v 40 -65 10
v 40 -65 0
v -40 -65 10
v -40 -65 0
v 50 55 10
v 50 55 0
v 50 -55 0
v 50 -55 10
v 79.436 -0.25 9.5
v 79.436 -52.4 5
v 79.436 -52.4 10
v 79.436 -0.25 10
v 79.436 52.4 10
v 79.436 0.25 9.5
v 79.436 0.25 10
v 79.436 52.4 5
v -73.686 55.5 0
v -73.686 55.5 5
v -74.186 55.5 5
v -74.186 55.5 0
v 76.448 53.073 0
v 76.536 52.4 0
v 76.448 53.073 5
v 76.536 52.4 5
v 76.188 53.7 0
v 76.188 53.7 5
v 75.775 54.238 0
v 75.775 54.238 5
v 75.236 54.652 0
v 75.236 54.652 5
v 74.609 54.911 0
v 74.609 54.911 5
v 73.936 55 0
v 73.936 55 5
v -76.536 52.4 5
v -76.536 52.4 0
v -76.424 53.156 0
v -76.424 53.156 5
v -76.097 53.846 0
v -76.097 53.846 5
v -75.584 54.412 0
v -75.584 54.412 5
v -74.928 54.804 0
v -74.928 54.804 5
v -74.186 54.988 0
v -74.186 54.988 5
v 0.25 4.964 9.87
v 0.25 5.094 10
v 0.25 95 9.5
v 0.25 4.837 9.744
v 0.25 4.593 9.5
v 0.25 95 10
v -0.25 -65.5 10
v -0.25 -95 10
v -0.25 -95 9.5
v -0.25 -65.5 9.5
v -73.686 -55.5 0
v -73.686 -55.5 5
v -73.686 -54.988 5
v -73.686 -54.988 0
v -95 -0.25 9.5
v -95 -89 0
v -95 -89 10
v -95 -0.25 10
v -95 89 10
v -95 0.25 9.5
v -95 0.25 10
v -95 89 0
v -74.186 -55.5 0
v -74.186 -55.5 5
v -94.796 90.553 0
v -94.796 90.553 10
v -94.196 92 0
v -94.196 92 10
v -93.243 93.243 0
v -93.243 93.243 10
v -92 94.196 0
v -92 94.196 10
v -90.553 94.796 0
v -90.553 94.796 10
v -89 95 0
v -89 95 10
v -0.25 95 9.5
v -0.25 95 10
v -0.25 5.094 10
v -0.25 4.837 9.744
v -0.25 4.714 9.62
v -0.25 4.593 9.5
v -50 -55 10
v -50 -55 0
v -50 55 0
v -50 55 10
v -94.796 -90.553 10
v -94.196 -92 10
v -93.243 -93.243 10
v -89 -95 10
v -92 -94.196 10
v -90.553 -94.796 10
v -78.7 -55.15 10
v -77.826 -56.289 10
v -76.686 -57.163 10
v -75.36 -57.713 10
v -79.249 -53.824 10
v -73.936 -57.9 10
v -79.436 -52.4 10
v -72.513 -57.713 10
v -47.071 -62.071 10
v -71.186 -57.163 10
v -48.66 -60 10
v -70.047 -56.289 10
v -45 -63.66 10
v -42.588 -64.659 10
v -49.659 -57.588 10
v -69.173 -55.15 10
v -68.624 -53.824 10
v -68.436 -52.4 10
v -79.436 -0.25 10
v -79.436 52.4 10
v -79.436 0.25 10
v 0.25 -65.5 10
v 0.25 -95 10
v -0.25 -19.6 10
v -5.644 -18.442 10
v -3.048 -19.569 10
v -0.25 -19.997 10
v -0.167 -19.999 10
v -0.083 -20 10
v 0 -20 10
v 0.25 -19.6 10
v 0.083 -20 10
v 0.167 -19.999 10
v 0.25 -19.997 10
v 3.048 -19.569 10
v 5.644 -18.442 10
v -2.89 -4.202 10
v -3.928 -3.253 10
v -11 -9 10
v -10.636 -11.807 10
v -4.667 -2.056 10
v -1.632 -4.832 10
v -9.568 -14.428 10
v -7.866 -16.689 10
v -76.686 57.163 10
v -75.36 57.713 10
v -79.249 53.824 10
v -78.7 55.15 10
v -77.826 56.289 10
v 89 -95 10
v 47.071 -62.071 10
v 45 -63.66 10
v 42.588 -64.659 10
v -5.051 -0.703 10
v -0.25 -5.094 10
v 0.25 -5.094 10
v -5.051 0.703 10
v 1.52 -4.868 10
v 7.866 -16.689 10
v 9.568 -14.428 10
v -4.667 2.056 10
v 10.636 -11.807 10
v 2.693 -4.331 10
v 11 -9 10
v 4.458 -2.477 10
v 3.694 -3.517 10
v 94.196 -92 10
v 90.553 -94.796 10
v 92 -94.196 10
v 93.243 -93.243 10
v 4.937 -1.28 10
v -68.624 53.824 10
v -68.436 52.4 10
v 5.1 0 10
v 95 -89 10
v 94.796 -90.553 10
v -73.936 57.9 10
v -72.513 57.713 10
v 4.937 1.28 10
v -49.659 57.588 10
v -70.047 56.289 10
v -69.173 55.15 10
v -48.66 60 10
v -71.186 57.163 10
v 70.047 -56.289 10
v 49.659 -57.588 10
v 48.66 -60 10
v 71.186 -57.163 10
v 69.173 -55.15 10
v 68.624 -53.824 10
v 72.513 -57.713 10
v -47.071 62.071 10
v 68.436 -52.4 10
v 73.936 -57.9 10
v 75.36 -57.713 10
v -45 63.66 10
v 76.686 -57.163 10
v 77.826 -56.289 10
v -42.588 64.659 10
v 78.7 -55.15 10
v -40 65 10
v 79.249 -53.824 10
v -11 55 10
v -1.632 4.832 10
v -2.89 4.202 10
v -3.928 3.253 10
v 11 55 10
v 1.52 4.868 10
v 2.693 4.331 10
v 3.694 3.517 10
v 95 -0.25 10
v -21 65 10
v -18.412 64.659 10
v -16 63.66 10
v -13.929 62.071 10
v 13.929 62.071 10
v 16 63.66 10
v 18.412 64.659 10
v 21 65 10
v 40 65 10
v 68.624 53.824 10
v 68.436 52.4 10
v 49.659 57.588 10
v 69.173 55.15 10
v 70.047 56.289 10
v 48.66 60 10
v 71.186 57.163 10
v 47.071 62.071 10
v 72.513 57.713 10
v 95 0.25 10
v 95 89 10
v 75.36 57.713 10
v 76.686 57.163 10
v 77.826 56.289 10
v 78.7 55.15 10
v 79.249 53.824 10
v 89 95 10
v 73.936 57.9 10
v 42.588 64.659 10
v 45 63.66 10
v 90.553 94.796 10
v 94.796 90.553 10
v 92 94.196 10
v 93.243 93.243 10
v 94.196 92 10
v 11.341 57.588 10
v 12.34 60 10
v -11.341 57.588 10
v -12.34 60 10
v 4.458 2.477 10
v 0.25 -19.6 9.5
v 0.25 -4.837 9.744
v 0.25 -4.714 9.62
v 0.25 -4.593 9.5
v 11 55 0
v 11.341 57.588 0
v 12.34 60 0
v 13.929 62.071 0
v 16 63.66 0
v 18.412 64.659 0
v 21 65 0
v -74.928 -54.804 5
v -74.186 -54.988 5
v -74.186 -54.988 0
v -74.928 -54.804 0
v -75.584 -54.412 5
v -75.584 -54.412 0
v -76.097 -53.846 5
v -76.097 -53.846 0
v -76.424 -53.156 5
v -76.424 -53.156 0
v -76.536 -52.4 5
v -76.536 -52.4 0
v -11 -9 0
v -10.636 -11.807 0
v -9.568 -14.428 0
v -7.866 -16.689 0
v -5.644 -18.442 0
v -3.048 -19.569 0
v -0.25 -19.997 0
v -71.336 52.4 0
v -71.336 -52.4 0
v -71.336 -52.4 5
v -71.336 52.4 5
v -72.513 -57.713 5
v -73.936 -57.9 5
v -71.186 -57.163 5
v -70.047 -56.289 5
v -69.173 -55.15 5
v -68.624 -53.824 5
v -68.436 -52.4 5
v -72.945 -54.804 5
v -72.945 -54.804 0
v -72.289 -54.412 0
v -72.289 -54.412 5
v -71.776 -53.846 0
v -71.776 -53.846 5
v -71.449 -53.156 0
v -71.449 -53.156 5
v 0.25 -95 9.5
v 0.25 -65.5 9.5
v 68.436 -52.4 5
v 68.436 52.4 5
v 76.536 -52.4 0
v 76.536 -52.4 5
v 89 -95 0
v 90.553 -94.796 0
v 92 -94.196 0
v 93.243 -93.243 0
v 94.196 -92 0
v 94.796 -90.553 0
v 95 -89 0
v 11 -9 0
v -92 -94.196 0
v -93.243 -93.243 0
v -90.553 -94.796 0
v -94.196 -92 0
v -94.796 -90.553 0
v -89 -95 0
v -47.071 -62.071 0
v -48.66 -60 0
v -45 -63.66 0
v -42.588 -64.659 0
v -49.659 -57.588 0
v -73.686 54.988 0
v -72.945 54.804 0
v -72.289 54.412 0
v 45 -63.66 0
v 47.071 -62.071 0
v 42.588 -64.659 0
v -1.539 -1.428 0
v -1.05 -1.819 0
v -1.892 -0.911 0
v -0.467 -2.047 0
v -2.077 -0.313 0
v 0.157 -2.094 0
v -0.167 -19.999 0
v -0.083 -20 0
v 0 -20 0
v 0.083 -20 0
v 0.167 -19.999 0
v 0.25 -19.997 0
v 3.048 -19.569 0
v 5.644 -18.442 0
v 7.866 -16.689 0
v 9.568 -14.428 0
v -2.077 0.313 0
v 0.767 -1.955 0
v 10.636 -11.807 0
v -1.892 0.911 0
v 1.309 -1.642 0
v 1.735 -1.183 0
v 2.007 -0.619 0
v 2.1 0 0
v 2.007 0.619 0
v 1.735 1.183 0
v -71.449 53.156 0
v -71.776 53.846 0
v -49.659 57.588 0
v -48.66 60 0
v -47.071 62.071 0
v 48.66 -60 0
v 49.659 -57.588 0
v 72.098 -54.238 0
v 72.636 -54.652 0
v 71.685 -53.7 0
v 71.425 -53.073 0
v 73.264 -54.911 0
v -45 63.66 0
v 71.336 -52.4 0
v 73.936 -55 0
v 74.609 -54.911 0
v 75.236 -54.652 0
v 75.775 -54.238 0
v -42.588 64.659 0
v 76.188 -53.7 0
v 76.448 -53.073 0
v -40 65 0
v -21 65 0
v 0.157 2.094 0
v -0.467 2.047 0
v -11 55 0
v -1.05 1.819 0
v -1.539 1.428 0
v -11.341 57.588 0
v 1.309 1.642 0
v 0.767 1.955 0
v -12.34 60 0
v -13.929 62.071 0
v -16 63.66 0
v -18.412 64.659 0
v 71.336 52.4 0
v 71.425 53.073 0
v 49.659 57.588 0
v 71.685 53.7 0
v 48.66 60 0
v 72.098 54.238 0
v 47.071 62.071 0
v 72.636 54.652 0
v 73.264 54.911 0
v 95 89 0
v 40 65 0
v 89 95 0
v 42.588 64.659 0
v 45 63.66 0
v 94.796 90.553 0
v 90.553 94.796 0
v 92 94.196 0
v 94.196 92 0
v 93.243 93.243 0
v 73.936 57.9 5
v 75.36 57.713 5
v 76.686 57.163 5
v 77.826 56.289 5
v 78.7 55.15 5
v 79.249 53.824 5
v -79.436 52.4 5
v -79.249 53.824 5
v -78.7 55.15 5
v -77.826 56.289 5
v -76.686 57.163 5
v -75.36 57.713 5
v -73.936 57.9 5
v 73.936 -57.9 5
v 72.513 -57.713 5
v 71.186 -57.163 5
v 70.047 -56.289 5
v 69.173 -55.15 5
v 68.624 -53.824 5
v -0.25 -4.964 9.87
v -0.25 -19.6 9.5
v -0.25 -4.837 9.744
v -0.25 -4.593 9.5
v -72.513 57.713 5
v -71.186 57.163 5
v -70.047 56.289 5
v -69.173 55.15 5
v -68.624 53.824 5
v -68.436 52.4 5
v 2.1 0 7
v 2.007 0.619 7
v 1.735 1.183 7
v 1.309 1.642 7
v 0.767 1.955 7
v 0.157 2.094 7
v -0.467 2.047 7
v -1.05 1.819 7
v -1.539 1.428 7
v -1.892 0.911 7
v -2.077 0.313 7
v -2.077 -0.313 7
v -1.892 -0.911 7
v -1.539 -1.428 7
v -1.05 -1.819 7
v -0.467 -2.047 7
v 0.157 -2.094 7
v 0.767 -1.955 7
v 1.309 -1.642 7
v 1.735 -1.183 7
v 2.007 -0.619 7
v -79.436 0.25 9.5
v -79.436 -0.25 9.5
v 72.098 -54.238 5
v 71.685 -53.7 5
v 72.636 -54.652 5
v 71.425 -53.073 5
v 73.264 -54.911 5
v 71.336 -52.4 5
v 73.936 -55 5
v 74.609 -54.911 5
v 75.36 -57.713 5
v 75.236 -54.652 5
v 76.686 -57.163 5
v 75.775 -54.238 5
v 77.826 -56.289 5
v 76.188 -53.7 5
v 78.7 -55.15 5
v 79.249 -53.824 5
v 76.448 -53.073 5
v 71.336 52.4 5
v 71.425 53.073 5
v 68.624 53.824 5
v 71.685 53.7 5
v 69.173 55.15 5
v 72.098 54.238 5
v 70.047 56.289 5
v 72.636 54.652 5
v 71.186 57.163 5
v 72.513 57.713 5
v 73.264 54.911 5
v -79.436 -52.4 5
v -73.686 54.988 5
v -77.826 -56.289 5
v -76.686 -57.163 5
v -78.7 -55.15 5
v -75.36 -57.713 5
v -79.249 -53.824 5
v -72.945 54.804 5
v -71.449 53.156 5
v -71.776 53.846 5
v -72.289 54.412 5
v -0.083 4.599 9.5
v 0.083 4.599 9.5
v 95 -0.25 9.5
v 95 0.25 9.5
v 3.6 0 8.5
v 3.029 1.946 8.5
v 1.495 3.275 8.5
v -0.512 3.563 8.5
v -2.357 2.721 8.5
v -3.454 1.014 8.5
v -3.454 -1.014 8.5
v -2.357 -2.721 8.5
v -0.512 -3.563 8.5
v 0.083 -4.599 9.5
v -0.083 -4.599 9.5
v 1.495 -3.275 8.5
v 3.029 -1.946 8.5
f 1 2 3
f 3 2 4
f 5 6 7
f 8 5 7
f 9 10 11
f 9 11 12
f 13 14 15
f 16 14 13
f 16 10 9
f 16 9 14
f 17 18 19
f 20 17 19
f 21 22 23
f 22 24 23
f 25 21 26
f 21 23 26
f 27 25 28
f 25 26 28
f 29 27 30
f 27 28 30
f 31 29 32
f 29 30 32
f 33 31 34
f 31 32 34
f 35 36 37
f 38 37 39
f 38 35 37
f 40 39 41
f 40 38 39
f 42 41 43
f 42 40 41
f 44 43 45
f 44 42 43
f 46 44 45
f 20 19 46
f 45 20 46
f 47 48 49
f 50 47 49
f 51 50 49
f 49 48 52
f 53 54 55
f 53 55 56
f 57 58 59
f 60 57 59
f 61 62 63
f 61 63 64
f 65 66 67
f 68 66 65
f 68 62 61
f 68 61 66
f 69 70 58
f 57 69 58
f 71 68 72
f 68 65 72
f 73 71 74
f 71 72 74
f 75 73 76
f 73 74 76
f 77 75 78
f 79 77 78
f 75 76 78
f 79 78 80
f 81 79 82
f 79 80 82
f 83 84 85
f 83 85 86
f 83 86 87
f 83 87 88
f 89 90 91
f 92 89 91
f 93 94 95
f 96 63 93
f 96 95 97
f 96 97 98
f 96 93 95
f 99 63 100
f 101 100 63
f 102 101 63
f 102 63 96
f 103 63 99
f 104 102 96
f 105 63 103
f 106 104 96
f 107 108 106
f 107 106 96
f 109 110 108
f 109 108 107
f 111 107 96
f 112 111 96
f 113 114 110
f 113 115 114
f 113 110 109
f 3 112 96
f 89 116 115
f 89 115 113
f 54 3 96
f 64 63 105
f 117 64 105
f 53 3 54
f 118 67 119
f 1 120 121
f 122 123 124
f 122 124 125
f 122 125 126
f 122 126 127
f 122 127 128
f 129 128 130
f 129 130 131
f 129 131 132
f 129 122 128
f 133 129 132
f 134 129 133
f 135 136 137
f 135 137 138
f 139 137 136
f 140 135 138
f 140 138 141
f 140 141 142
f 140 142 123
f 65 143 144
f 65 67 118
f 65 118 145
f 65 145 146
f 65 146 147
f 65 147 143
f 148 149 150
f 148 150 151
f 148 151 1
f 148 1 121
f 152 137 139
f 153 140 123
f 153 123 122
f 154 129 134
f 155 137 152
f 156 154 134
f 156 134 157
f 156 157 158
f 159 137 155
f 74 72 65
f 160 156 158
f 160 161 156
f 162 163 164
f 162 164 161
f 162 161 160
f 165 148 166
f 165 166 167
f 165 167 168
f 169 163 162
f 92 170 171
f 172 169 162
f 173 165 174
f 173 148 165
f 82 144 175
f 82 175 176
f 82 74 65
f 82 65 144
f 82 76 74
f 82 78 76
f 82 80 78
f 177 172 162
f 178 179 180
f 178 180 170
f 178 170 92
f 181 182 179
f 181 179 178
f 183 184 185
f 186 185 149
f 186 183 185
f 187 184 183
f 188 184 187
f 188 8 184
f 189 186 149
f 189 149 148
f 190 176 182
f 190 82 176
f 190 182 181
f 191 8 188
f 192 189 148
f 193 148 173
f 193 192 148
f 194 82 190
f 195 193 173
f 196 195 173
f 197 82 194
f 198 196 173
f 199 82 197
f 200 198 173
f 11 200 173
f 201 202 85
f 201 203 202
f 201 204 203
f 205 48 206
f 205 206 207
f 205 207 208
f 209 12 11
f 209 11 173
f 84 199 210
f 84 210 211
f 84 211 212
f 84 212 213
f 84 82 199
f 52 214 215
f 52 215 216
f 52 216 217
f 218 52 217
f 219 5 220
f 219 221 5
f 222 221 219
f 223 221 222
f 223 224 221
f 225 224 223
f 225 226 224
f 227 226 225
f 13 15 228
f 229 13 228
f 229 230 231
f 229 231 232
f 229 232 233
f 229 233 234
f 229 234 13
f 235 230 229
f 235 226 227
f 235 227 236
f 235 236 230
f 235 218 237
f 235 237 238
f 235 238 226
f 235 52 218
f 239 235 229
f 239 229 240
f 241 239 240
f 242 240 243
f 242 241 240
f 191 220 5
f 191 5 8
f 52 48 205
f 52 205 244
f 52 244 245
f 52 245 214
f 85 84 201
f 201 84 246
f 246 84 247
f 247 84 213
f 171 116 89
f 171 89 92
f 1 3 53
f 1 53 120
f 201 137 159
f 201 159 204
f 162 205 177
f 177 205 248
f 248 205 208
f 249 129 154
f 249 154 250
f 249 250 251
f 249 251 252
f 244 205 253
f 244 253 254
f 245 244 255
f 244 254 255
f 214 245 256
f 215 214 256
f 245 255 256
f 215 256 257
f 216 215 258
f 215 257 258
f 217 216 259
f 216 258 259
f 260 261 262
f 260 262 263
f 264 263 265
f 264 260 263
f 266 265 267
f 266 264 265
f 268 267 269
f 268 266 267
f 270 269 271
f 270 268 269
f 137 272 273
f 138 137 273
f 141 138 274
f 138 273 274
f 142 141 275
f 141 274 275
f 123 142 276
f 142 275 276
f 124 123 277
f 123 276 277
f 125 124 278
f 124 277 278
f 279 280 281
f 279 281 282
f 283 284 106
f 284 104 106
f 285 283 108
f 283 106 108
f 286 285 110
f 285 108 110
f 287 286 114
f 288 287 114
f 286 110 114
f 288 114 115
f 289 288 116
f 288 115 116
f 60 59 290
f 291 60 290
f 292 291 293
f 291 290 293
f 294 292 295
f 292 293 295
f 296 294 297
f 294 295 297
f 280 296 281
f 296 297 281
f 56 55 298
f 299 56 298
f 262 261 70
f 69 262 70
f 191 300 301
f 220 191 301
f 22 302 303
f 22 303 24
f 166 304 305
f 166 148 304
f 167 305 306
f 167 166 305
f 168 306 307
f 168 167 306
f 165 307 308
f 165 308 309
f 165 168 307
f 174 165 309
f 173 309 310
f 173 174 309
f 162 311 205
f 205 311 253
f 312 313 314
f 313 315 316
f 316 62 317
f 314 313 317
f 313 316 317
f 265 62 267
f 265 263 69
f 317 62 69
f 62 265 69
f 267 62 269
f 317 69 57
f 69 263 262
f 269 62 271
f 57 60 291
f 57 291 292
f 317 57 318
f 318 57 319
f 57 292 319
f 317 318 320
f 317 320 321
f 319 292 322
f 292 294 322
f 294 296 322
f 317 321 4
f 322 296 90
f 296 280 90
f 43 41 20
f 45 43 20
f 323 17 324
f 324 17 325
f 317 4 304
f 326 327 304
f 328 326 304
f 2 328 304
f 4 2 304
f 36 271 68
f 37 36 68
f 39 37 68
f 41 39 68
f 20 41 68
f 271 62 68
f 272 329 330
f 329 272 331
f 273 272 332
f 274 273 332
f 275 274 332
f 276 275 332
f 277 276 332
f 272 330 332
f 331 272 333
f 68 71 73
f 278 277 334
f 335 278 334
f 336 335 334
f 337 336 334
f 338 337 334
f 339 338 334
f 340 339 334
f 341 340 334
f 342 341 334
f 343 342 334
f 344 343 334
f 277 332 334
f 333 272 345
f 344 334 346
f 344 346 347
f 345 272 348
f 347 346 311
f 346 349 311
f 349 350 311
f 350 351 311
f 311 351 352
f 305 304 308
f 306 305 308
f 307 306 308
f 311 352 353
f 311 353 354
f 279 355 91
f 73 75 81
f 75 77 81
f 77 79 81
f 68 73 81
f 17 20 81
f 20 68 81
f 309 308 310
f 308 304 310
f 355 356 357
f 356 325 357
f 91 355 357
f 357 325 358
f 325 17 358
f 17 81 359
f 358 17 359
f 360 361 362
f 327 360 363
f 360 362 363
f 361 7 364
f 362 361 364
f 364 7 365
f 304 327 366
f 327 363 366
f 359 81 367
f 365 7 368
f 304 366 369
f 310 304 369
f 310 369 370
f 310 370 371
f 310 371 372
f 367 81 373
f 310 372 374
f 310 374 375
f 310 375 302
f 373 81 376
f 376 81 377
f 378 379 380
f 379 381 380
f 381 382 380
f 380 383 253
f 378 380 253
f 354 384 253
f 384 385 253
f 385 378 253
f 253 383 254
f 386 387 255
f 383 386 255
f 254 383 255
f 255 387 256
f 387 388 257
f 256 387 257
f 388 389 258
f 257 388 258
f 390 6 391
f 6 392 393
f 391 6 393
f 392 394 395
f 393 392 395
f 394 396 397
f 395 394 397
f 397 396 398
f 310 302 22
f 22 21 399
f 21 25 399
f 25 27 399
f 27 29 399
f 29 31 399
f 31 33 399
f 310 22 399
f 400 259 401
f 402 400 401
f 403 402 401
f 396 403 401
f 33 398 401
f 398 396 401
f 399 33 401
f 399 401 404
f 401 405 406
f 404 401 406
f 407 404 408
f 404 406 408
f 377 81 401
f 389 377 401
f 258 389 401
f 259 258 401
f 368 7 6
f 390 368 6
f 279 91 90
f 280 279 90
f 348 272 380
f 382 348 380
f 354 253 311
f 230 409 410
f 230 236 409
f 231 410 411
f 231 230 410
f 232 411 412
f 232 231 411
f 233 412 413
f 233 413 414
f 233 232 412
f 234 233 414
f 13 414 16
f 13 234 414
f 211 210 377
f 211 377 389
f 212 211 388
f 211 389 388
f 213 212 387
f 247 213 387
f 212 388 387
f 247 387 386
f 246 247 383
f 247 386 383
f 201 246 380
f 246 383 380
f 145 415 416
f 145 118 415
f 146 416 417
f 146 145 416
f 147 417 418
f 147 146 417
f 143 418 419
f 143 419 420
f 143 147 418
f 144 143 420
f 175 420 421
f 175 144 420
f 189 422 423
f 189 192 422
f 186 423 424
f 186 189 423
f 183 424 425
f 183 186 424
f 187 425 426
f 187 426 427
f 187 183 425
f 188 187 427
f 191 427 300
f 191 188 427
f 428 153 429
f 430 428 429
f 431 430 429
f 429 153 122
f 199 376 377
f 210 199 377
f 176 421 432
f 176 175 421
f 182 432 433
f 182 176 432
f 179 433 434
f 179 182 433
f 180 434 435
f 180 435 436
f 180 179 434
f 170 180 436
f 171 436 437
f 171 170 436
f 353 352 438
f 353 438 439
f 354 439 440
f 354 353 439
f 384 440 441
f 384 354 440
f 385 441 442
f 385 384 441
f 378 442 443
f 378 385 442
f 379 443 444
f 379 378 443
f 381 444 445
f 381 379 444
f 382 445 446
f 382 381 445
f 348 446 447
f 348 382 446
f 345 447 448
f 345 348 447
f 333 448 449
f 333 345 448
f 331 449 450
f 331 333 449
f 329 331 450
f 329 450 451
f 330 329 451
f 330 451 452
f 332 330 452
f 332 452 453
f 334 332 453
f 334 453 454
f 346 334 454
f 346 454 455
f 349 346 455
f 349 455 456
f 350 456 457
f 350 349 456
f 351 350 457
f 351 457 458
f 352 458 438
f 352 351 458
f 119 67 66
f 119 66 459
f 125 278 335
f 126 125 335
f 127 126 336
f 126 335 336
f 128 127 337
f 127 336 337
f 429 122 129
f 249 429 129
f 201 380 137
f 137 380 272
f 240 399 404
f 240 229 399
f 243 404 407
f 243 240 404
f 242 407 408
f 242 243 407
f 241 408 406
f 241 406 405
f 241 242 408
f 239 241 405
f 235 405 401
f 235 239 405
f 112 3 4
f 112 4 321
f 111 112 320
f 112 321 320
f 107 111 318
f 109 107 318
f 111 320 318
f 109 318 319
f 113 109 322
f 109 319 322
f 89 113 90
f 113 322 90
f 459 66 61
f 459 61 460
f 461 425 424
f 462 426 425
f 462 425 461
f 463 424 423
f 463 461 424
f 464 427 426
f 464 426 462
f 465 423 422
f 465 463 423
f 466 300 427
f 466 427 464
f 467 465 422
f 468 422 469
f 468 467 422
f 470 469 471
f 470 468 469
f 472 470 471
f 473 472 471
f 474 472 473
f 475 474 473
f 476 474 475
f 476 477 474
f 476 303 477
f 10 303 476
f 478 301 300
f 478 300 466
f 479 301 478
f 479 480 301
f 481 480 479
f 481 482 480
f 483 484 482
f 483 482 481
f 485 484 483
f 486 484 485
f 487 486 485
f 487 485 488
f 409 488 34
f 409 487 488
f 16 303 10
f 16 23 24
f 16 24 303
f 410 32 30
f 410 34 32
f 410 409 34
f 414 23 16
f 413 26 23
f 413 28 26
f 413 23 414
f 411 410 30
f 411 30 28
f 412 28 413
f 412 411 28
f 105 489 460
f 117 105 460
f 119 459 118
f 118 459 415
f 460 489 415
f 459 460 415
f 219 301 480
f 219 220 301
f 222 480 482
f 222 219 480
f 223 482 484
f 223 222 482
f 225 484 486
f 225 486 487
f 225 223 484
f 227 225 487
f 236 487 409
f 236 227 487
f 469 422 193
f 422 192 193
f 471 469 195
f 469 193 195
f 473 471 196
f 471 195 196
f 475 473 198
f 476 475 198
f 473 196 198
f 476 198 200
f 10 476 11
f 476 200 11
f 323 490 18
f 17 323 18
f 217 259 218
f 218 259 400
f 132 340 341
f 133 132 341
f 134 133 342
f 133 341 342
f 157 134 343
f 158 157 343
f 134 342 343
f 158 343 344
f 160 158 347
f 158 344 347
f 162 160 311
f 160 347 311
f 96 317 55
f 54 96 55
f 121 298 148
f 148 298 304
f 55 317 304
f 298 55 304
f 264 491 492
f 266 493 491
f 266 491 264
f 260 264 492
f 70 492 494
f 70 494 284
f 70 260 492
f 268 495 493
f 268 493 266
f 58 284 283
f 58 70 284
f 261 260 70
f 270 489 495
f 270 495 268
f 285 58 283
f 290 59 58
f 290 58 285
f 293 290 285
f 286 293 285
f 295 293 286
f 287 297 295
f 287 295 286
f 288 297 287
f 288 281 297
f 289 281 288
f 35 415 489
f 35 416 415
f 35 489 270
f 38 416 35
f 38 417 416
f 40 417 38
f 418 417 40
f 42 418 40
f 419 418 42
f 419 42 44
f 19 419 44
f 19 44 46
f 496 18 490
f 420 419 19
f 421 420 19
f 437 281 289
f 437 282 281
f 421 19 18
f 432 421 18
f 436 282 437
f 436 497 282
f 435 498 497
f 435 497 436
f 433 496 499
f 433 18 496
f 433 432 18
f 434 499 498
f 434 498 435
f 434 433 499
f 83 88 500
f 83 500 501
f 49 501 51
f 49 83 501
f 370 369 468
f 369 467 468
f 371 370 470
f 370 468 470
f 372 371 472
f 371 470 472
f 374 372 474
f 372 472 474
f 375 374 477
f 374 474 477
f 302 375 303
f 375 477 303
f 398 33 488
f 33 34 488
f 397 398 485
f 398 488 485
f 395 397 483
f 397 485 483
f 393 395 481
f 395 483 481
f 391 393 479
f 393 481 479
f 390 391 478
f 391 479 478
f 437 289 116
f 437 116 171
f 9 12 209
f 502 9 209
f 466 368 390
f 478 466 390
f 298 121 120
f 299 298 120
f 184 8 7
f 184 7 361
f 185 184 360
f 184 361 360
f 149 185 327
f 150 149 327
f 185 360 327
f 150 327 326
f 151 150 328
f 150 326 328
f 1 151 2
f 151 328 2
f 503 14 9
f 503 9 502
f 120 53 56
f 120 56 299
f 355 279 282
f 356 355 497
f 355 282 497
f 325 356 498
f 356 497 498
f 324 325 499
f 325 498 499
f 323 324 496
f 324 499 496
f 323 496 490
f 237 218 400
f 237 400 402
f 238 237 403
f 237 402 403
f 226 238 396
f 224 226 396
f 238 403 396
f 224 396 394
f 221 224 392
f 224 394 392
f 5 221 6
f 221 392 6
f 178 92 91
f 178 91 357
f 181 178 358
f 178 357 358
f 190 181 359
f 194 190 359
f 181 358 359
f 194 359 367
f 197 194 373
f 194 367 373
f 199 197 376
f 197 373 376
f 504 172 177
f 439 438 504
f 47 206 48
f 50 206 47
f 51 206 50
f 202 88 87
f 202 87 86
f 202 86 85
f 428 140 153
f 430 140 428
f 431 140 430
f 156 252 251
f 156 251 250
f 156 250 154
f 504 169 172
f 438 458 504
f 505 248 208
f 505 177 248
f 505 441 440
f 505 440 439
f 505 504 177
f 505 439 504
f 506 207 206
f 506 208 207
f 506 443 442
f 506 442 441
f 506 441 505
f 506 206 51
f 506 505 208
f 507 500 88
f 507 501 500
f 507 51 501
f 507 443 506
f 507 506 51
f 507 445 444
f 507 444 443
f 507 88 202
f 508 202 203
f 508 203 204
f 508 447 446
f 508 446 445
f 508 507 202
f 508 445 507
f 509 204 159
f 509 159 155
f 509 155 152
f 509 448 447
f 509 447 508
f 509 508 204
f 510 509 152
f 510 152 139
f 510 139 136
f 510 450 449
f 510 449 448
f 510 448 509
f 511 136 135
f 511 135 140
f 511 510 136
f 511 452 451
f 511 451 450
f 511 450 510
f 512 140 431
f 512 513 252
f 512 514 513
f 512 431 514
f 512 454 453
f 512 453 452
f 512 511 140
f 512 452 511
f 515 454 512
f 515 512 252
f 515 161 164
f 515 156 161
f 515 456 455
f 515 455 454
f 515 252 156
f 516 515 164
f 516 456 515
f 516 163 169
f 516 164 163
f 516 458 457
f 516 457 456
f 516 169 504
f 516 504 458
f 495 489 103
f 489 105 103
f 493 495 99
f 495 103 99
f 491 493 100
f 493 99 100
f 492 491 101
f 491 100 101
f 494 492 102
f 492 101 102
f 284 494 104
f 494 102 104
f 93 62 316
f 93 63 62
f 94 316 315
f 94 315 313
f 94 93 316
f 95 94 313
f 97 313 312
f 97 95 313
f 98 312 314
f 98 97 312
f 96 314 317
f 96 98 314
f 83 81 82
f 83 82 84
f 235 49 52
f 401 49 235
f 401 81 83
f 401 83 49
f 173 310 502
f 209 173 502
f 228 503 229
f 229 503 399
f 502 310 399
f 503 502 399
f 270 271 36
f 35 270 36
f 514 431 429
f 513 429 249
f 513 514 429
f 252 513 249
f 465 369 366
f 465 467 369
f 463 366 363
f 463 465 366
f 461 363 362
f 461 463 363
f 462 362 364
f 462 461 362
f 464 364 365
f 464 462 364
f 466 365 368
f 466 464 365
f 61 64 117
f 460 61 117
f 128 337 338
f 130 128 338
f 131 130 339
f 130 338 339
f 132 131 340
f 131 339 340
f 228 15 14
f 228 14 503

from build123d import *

# Parameters (mm, degrees)
F0_W         = 190
F0_H         = 190
F0_W_2       = 11
F0_H_2       = 115.8
F0_R         = 2.1
F0_W_3       = 0.5
F0_H_3       = 0.5
F1_DEPTH     = 10
F0_W_4       = 5.2
F0_H_4       = 110
F2_DEPTH     = 5
F3_R         = 2.59999
F4_R         = 5.49999
F6_DEPTH     = 25
F8_R         = 6
F7_W         = 0.5
F7_H         = 29.5
F9_DEPTH     = 0.5
F7_W_2       = 15.563522011
F7_H_2       = 0.5
F10_DEPTH    = 0.5
F11_T2_ANGLE = 359.64
F11_T4_ANGLE = 293.7301704478
F11_T6_ANGLE = 293.7301704478


# Not quite as in the source:
# - a fillet or chamfer that OpenCascade refuses, or shapes differently, is made with other operations: its cross-section is extruded or revolved along the edge and cut away or added
# - a fillet or chamfer is up to 0.001 mm smaller than in the source, because OpenCascade refuses the exact size
# - ends of sketch curves that miss each other by under 0.0002 mm in the source are joined


with BuildPart() as f1:
    # F0 (on Top) → F1 (new body)
    with BuildSketch(Plane.XY):
        Rectangle(F0_W, F0_H)
        with BuildLine():
            ThreePointArc((50, -55), (47.0710678119, -62.0710678119), (40, -65))
            Line((40, -65), (0.25, -65))
            Line((0.25, -65), (0.25, -65.5))
            Line((0.25, -65.5), (-0.25, -65.5))
            Line((-0.25, -65.5), (-0.25, -65))
            Line((-0.25, -65), (-40, -65))
            ThreePointArc((-40, -65), (-47.0710678119, -62.0710678119), (-50, -55))
            Line((-50, -55), (-50, 55))
            ThreePointArc((-50, 55), (-47.0710678119, 62.0710678119), (-40, 65))
            Line((-40, 65), (-21, 65))
            ThreePointArc((-21, 65), (-13.9289321881, 62.0710678119), (-11, 55))
            Line((-11, 55), (-11, -9))
            ThreePointArc((-11, -9), (-7.8660663613, -16.6892782496), (-0.25, -19.997158724))
            Line((-0.25, -19.997158724), (-0.25, -19.5))
            Line((-0.25, -19.5), (0.25, -19.5))
            Line((0.25, -19.5), (0.25, -19.997158724))
            ThreePointArc((0.25, -19.997158724), (7.8660663613, -16.6892782496), (11, -9))
            Line((11, -9), (11, 55))
            ThreePointArc((11, 55), (13.9289321881, 62.0710678119), (21, 65))
            Line((21, 65), (40, 65))
            ThreePointArc((40, 65), (47.0710678119, 62.0710678119), (50, 55))
            Line((50, 55), (50, -55))
        make_face(mode=Mode.SUBTRACT)
        with Locations((-73.936477989, 0)):
            Rectangle(F0_W_2, F0_H_2, mode=Mode.SUBTRACT)
        Circle(F0_R, mode=Mode.SUBTRACT)
        with Locations((73.936477989, 0)):
            Rectangle(F0_W_2, F0_H_2, mode=Mode.SUBTRACT)
        with BuildLine():
            ThreePointArc((0, -20), (0.1250080726, -19.9992896581), (0.25, -19.997158724))
            Line((0.25, -19.997158724), (0.25, -19.5))
            Line((0.25, -19.5), (-0.25, -19.5))
            Line((-0.25, -19.5), (-0.25, -19.997158724))
            ThreePointArc((-0.25, -19.997158724), (-0.1250080726, -19.9992896581), (0, -20))
        make_face()
        with Locations((0, -65.25)):
            Rectangle(F0_W_3, F0_H_3)
    extrude(amount=F1_DEPTH)

    # F0 (on Top) → F2 (join)
    with BuildSketch(Plane.XY):
        with Locations((-73.936477989, 0)):
            Rectangle(F0_W_2, F0_H_2)
        with Locations((-73.936477989, 0)):
            Rectangle(F0_W_4, F0_H_4, mode=Mode.SUBTRACT)
        with Locations((73.936477989, 0)):
            Rectangle(F0_W_2, F0_H_2)
        with Locations((73.936477989, 0)):
            Rectangle(F0_W_4, F0_H_4, mode=Mode.SUBTRACT)
    extrude(amount=F2_DEPTH)

    # F3 (radius 2.6 in the source; OpenCascade refuses exactly that, so slightly less here)
    f3_edges = [f1.edges().sort_by_distance(p)[0] for p in [
        (-76.536478, 55, 2.5),
        (-71.336478, 55, 2.5),
        (-76.536478, -55, 2.5),
        (-71.336478, -55, 2.5),
        (76.536478, -55, 2.5),
        (71.336478, -55, 2.5),
        (71.336478, 55, 2.5),
        (76.536478, 55, 2.5),
    ]]
    fillet(f3_edges, radius=F3_R)

    # F4 (radius 5.5 in the source; OpenCascade refuses exactly that, so slightly less here)
    f4_edges = [f1.edges().sort_by_distance(p)[0] for p in [
        (-79.436478, 57.9, 7.5),
        (-68.436478, 57.9, 7.5),
        (79.436478, 57.9, 7.5),
        (68.436478, 57.9, 7.5),
        (68.436478, -57.9, 7.5),
        (79.436478, -57.9, 7.5),
        (-79.436478, -57.9, 7.5),
        (-68.436478, -57.9, 7.5),
    ]]
    fillet(f4_edges, radius=F4_R)

    # F5 (on face) → F6 (cut)
    with BuildSketch(Plane.XY.offset(5)):
        with BuildLine():
            Line((-73.686477989, -55.5), (-73.686477989, -54.9879537784))
            ThreePointArc((-73.686477989, -54.9879537784), (-73.8113279558, -54.9969866984), (-73.936467989, -55))
            ThreePointArc((-73.936467989, -55), (-74.0616280221, -54.9969866984), (-74.186477989, -54.9879537784))
            Line((-74.186477989, -54.9879537784), (-74.186477989, -55.5))
            Line((-74.186477989, -55.5), (-73.686477989, -55.5))
        make_face()
        with BuildLine():
            ThreePointArc((-73.936467989, 55), (-73.8113279558, 54.9969866984), (-73.686477989, 54.9879537784))
            Line((-73.686477989, 54.9879537784), (-73.686477989, 55.5))
            Line((-73.686477989, 55.5), (-74.186477989, 55.5))
            Line((-74.186477989, 55.5), (-74.186477989, 54.9879537784))
            ThreePointArc((-74.186477989, 54.9879537784), (-74.0616280221, 54.9969866984), (-73.936467989, 55))
        make_face()
    extrude(amount=-F6_DEPTH, mode=Mode.SUBTRACT)

    # F8
    f8_edges = [f1.edges().sort_by_distance(p)[0] for p in [
        (-95, -95, 5),
        (95, -95, 5),
        (95, 95, 5),
        (-95, 95, 5),
    ]]
    fillet(f8_edges, radius=F8_R)

    # F7 (on face) → F9 (cut)
    with BuildSketch(Plane.XY.offset(10)):
        with BuildLine():
            Line((-0.25, 95), (-0.25, 2.0850659462))
            ThreePointArc((-0.25, 2.0850659462), (0, 2.1), (0.25, 2.0850659462))
            Line((0.25, 2.0850659462), (0.25, 95))
            Line((0.25, 95), (-0.25, 95))
        make_face()
        with BuildLine():
            Line((-0.25, -2.0850659462), (-0.25, -19.6))
            Line((-0.25, -19.6), (0.25, -19.6))
            Line((0.25, -19.6), (0.25, -2.0850659462))
            ThreePointArc((0.25, -2.0850659462), (0, -2.1), (-0.25, -2.0850659462))
        make_face()
        with Locations((0, -80.25)):
            Rectangle(F7_W, F7_H)
        with BuildLine():
            Line((-0.25, -0.25), (-0.25, -2.0850659462))
            ThreePointArc((-0.25, -2.0850659462), (0, -2.1), (0.25, -2.0850659462))
            Line((0.25, -2.0850659462), (0.25, -0.25))
            Line((0.25, -0.25), (-0.25, -0.25))
        make_face()
        with BuildLine():
            Line((-0.25, 2.0850659462), (-0.25, 0.25))
            Line((-0.25, 0.25), (0.25, 0.25))
            Line((0.25, 0.25), (0.25, 2.0850659462))
            ThreePointArc((0.25, 2.0850659462), (0, 2.1), (-0.25, 2.0850659462))
        make_face()
    extrude(amount=-F9_DEPTH, mode=Mode.SUBTRACT)

    # F7 (on face) → F10 (cut)
    with BuildSketch(Plane.XY.offset(10)):
        with Locations((87.2182389945, 0)):
            Rectangle(F7_W_2, F7_H_2)
        with Locations((-87.2182389945, 0)):
            Rectangle(F7_W_2, F7_H_2)
    extrude(amount=-F10_DEPTH, mode=Mode.SUBTRACT)

    # F11: chamfer of 3 on 3 edges, made by hand

    # F11_s1 → F11_t2 (revolve, cut)
    with BuildSketch(Plane(origin=(0, 0, 0), x_dir=(0, 0, 1), z_dir=(0.0031415875, -0.9999950652, 0))):
        Polygon((10, -5.1), (7, -2.1), (10, -2.1), align=None)
    revolve(axis=Axis((0, 0, 10), (0, 0, 1)), revolution_arc=F11_T2_ANGLE, mode=Mode.SUBTRACT)

    # F11_s3 → F11_t4 (revolve, cut)
    with BuildSketch(Plane(origin=(0, 0, 0), x_dir=(0, 0, 1), z_dir=(0.9154508113, -0.4024298847, 0))):
        Polygon((10, -5.1), (7, -2.1), (10, -2.1), align=None)
    revolve(axis=Axis((0, 0, 10), (0, 0, 1)), revolution_arc=F11_T4_ANGLE, mode=Mode.SUBTRACT)

    # F11_s5 → F11_t6 (revolve, cut)
    with BuildSketch(Plane.XZ):
        Polygon((5.1, 10), (2.1, 7), (2.1, 10), align=None)
    revolve(axis=Axis((0, 0, 10), (0, 0, 1)), revolution_arc=F11_T6_ANGLE, mode=Mode.SUBTRACT)


solid = f1.part
